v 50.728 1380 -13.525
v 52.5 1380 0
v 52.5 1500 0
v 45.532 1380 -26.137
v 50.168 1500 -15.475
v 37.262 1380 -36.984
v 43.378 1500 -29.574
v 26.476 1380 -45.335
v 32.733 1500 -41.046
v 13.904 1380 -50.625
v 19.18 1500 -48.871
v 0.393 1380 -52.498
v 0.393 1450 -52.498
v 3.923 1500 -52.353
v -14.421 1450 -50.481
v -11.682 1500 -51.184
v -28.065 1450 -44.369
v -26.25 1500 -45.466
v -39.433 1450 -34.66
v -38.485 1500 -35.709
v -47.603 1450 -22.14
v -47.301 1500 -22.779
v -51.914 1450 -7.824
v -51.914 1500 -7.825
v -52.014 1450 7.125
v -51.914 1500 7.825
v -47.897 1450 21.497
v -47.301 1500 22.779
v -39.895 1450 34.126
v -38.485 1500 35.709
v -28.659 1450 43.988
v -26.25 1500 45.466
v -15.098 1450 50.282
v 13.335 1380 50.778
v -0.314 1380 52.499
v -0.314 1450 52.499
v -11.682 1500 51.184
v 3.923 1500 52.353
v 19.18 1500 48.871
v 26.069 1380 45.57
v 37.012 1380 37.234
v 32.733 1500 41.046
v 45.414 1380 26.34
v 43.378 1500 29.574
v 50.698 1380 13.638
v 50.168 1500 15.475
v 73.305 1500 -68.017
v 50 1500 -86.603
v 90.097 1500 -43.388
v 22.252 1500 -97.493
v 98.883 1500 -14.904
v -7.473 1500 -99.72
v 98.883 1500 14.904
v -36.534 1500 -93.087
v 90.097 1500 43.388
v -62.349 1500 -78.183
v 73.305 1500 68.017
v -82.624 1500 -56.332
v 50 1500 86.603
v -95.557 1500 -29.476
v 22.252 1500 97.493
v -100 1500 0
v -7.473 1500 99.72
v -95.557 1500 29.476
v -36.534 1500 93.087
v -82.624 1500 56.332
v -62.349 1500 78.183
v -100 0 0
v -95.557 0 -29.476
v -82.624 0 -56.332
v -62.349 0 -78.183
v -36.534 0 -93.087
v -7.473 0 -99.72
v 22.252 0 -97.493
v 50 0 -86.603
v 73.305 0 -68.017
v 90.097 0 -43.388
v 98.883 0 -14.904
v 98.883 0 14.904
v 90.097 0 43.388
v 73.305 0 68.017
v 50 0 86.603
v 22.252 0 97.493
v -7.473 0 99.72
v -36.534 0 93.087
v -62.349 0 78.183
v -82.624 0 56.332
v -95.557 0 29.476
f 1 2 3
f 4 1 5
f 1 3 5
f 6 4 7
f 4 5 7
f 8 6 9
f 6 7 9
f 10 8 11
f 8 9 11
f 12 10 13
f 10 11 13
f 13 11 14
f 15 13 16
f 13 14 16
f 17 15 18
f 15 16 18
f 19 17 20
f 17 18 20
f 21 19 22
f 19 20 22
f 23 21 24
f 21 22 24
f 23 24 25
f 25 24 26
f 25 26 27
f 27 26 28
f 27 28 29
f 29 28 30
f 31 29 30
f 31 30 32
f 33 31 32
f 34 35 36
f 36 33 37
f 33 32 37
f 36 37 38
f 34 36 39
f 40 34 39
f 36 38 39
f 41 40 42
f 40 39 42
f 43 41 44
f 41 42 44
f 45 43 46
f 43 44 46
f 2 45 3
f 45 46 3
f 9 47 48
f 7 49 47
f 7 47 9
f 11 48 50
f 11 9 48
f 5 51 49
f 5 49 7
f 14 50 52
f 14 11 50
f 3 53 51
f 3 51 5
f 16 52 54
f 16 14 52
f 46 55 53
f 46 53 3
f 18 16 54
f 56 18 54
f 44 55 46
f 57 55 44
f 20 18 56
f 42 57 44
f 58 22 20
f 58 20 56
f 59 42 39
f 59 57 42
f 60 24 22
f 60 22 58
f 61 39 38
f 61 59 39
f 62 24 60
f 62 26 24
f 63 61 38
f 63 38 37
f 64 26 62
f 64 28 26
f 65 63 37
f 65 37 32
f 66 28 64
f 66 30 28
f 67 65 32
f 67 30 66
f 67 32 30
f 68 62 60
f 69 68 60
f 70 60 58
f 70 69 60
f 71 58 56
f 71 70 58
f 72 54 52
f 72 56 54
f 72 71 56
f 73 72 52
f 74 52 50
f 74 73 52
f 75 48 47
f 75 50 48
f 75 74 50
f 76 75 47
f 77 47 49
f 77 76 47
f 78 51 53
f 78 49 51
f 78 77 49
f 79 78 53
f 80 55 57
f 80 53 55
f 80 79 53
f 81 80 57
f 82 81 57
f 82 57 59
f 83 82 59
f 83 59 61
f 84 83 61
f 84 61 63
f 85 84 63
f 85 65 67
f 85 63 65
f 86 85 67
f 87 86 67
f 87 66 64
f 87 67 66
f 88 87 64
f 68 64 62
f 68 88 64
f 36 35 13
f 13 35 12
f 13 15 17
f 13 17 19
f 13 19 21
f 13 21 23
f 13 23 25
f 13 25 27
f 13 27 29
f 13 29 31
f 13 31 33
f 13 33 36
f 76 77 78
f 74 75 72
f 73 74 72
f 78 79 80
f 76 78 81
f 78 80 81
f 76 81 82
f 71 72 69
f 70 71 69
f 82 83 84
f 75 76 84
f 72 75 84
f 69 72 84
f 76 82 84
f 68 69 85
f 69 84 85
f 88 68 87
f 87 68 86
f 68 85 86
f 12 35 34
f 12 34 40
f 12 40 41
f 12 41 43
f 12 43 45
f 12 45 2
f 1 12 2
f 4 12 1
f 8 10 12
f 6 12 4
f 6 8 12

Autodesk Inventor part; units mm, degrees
ref_plane "YZ Plane" through (0, 0, 0) normal (1, 0, 0) x (0, 1, 0)
ref_plane "XZ Plane" through (0, 0, 0) normal (0, 1, 0) x (-1, 0, 0)
ref_plane "XY Plane" through (0, 0, 0) normal (0, 0, 1) x (1, 0, 0)
sketch "スケッチ1" plane through (0, 0, 0) normal (0, 1, 0) x (-1, 0, 0)
  circle A0 centre (0, 0) radius 100
  dimension "d0" = 200
extrude "押し出し1" add sketch "スケッチ1" along normal blind 1500
sketch "スケッチ2" plane through (0, 1500, 0) normal (0, 1, 0) x (1, 0, 0)
  circle A0 centre (0, 0) radius 25
  dimension "d3" = 50
extrude "押し出し2" cut sketch "スケッチ2" against normal blind 50
sketch "スケッチ3" plane through (0, 1500, 0) normal (0, 1, 0) x (1, 0, 0)
  point P0 (0, 0)
sketch "スケッチ4" plane through (0, 1500, 0) normal (0, 1, 0) x (1, 0, 0)
  circle A0 centre (0, 0) radius 25 projected
  circle A1 centre (0, 0) radius 50
  dimension "d6" = 100
extrude "押し出し3" cut sketch "スケッチ4" against normal blind 120 contours A0 | A1
sketch "スケッチ5" plane through (0, 1500, 0) normal (0, 1, 0) x (1, 0, 0)
  circle A0 centre (0, 0) radius 52.5
  dimension "d9" = 105
extrude "押し出し4" cut sketch "スケッチ5" against normal blind 120
sketch "スケッチ6" plane through (0, 1380, 0) normal (0, 1, 0) x (1, 0, 0)
  circle A0 centre (0, 0) radius 52.5 projected
  arc A1 (0.3926, 52.4985) -> (-0.3135, -52.4991) centre (0, 0) ccw
  line L0 (-0.3135, -52.4991) -> (0.3926, 52.4985)
extrude "押し出し5" add sketch "スケッチ6" along normal blind 70 contours L0 A0 picked at (-3.2934, -17.1824)
properties part number "poal1"
